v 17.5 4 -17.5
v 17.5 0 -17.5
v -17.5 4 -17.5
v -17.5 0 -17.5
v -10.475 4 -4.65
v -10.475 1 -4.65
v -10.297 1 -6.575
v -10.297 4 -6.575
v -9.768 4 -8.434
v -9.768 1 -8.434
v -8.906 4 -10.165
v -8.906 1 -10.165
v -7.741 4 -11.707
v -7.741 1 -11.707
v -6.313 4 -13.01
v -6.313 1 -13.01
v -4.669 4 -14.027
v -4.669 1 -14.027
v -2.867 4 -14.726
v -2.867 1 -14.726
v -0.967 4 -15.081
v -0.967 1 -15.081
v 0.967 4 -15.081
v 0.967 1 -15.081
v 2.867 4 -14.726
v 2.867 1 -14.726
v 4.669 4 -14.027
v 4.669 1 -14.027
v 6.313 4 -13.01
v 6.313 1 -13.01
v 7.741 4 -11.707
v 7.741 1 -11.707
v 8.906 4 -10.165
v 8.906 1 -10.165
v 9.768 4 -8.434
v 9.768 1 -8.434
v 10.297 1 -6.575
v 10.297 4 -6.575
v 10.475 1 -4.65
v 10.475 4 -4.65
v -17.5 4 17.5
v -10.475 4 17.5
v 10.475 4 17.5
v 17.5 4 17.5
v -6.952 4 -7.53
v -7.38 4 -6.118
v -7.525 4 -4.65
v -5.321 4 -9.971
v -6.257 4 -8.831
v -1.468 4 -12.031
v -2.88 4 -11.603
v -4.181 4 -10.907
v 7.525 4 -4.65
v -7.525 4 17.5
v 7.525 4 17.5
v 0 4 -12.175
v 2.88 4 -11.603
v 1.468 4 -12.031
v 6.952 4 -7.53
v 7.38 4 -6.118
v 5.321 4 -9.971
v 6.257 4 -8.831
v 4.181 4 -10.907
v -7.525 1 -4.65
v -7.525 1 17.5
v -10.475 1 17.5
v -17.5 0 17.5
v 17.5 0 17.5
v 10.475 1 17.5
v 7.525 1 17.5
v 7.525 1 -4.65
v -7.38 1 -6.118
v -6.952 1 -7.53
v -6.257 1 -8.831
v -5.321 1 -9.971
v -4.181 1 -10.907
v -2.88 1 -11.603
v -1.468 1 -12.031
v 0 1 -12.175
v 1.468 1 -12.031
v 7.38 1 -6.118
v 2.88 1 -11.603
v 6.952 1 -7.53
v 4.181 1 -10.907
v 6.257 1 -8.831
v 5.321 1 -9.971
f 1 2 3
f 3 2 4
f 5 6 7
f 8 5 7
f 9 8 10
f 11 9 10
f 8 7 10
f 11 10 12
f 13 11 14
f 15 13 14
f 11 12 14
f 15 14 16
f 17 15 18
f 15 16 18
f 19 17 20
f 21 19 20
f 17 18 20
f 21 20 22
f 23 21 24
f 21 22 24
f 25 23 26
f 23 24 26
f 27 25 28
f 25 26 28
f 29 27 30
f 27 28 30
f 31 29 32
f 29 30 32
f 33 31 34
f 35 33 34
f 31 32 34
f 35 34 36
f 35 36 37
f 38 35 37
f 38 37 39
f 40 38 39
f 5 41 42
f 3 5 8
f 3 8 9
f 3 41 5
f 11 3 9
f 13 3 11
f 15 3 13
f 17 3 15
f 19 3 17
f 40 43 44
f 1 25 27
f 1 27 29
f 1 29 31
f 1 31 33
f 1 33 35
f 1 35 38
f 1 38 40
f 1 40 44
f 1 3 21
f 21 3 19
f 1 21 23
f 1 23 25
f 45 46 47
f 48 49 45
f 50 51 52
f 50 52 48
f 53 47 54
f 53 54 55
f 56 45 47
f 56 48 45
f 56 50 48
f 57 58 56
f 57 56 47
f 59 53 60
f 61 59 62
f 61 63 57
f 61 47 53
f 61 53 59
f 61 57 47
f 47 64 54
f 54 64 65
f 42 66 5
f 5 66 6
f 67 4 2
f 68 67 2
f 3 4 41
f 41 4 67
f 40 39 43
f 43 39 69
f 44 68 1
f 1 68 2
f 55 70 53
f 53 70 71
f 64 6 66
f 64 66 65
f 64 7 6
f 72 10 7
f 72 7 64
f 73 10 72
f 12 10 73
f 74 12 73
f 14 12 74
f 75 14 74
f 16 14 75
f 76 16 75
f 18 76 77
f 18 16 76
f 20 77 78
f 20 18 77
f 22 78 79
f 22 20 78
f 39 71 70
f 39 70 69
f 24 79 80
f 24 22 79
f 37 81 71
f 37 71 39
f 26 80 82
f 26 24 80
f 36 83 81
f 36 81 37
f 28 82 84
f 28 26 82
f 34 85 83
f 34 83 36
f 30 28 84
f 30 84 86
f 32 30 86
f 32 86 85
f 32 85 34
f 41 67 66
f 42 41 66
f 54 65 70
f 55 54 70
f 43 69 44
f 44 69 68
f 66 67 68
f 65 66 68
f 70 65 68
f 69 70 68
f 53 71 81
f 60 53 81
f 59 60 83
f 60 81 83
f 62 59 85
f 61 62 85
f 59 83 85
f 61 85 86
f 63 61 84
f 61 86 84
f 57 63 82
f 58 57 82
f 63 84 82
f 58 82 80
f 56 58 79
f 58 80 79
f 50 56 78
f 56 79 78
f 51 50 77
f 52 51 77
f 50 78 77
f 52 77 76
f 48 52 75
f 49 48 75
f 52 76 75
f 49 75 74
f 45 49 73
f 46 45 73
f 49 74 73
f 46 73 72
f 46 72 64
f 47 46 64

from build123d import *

# Parameters (mm, degrees)
SKETCH1_W           = 35
SKETCH1_H           = 35
BOSS_EXTRUDE1_DEPTH = 1
BOSS_EXTRUDE2_DEPTH = 3


with BuildPart() as part:
    # Sketch1 → Boss-Extrude1 (new body)
    with BuildSketch(Plane(origin=(0, 0, 0), x_dir=(1, 0, 0), z_dir=(0, 1, 0))):
        Rectangle(SKETCH1_W, SKETCH1_H)
    extrude(amount=BOSS_EXTRUDE1_DEPTH)

    # Sketch2 → Boss-Extrude2 (add)
    with BuildSketch(Plane(origin=(0, 1, 0), x_dir=(1, 0, 0), z_dir=(0, 1, 0))):
        with BuildLine():
            Line((-17.5, -17.5), (-10.475, -17.5))
            Line((-10.475, -17.5), (-10.475, 4.65042043))
            ThreePointArc((-10.475, 4.65042043), (0, 15.12542043), (10.475, 4.65042043))
            Line((10.475, 4.65042043), (10.475, -17.5))
            Line((10.475, -17.5), (17.5, -17.5))
            Line((17.5, -17.5), (17.5, 17.5))
            Line((17.5, 17.5), (-17.5, 17.5))
            Line((-17.5, 17.5), (-17.5, -17.5))
        make_face()
        with BuildLine():
            Line((-7.525, 4.65042043), (-7.525, -17.5))
            Line((-7.525, -17.5), (7.525, -17.5))
            Line((7.525, -17.5), (7.525, 4.65042043))
            ThreePointArc((7.525, 4.65042043), (0, 12.17542043), (-7.525, 4.65042043))
        make_face()
    extrude(amount=BOSS_EXTRUDE2_DEPTH)


solid = part.part
